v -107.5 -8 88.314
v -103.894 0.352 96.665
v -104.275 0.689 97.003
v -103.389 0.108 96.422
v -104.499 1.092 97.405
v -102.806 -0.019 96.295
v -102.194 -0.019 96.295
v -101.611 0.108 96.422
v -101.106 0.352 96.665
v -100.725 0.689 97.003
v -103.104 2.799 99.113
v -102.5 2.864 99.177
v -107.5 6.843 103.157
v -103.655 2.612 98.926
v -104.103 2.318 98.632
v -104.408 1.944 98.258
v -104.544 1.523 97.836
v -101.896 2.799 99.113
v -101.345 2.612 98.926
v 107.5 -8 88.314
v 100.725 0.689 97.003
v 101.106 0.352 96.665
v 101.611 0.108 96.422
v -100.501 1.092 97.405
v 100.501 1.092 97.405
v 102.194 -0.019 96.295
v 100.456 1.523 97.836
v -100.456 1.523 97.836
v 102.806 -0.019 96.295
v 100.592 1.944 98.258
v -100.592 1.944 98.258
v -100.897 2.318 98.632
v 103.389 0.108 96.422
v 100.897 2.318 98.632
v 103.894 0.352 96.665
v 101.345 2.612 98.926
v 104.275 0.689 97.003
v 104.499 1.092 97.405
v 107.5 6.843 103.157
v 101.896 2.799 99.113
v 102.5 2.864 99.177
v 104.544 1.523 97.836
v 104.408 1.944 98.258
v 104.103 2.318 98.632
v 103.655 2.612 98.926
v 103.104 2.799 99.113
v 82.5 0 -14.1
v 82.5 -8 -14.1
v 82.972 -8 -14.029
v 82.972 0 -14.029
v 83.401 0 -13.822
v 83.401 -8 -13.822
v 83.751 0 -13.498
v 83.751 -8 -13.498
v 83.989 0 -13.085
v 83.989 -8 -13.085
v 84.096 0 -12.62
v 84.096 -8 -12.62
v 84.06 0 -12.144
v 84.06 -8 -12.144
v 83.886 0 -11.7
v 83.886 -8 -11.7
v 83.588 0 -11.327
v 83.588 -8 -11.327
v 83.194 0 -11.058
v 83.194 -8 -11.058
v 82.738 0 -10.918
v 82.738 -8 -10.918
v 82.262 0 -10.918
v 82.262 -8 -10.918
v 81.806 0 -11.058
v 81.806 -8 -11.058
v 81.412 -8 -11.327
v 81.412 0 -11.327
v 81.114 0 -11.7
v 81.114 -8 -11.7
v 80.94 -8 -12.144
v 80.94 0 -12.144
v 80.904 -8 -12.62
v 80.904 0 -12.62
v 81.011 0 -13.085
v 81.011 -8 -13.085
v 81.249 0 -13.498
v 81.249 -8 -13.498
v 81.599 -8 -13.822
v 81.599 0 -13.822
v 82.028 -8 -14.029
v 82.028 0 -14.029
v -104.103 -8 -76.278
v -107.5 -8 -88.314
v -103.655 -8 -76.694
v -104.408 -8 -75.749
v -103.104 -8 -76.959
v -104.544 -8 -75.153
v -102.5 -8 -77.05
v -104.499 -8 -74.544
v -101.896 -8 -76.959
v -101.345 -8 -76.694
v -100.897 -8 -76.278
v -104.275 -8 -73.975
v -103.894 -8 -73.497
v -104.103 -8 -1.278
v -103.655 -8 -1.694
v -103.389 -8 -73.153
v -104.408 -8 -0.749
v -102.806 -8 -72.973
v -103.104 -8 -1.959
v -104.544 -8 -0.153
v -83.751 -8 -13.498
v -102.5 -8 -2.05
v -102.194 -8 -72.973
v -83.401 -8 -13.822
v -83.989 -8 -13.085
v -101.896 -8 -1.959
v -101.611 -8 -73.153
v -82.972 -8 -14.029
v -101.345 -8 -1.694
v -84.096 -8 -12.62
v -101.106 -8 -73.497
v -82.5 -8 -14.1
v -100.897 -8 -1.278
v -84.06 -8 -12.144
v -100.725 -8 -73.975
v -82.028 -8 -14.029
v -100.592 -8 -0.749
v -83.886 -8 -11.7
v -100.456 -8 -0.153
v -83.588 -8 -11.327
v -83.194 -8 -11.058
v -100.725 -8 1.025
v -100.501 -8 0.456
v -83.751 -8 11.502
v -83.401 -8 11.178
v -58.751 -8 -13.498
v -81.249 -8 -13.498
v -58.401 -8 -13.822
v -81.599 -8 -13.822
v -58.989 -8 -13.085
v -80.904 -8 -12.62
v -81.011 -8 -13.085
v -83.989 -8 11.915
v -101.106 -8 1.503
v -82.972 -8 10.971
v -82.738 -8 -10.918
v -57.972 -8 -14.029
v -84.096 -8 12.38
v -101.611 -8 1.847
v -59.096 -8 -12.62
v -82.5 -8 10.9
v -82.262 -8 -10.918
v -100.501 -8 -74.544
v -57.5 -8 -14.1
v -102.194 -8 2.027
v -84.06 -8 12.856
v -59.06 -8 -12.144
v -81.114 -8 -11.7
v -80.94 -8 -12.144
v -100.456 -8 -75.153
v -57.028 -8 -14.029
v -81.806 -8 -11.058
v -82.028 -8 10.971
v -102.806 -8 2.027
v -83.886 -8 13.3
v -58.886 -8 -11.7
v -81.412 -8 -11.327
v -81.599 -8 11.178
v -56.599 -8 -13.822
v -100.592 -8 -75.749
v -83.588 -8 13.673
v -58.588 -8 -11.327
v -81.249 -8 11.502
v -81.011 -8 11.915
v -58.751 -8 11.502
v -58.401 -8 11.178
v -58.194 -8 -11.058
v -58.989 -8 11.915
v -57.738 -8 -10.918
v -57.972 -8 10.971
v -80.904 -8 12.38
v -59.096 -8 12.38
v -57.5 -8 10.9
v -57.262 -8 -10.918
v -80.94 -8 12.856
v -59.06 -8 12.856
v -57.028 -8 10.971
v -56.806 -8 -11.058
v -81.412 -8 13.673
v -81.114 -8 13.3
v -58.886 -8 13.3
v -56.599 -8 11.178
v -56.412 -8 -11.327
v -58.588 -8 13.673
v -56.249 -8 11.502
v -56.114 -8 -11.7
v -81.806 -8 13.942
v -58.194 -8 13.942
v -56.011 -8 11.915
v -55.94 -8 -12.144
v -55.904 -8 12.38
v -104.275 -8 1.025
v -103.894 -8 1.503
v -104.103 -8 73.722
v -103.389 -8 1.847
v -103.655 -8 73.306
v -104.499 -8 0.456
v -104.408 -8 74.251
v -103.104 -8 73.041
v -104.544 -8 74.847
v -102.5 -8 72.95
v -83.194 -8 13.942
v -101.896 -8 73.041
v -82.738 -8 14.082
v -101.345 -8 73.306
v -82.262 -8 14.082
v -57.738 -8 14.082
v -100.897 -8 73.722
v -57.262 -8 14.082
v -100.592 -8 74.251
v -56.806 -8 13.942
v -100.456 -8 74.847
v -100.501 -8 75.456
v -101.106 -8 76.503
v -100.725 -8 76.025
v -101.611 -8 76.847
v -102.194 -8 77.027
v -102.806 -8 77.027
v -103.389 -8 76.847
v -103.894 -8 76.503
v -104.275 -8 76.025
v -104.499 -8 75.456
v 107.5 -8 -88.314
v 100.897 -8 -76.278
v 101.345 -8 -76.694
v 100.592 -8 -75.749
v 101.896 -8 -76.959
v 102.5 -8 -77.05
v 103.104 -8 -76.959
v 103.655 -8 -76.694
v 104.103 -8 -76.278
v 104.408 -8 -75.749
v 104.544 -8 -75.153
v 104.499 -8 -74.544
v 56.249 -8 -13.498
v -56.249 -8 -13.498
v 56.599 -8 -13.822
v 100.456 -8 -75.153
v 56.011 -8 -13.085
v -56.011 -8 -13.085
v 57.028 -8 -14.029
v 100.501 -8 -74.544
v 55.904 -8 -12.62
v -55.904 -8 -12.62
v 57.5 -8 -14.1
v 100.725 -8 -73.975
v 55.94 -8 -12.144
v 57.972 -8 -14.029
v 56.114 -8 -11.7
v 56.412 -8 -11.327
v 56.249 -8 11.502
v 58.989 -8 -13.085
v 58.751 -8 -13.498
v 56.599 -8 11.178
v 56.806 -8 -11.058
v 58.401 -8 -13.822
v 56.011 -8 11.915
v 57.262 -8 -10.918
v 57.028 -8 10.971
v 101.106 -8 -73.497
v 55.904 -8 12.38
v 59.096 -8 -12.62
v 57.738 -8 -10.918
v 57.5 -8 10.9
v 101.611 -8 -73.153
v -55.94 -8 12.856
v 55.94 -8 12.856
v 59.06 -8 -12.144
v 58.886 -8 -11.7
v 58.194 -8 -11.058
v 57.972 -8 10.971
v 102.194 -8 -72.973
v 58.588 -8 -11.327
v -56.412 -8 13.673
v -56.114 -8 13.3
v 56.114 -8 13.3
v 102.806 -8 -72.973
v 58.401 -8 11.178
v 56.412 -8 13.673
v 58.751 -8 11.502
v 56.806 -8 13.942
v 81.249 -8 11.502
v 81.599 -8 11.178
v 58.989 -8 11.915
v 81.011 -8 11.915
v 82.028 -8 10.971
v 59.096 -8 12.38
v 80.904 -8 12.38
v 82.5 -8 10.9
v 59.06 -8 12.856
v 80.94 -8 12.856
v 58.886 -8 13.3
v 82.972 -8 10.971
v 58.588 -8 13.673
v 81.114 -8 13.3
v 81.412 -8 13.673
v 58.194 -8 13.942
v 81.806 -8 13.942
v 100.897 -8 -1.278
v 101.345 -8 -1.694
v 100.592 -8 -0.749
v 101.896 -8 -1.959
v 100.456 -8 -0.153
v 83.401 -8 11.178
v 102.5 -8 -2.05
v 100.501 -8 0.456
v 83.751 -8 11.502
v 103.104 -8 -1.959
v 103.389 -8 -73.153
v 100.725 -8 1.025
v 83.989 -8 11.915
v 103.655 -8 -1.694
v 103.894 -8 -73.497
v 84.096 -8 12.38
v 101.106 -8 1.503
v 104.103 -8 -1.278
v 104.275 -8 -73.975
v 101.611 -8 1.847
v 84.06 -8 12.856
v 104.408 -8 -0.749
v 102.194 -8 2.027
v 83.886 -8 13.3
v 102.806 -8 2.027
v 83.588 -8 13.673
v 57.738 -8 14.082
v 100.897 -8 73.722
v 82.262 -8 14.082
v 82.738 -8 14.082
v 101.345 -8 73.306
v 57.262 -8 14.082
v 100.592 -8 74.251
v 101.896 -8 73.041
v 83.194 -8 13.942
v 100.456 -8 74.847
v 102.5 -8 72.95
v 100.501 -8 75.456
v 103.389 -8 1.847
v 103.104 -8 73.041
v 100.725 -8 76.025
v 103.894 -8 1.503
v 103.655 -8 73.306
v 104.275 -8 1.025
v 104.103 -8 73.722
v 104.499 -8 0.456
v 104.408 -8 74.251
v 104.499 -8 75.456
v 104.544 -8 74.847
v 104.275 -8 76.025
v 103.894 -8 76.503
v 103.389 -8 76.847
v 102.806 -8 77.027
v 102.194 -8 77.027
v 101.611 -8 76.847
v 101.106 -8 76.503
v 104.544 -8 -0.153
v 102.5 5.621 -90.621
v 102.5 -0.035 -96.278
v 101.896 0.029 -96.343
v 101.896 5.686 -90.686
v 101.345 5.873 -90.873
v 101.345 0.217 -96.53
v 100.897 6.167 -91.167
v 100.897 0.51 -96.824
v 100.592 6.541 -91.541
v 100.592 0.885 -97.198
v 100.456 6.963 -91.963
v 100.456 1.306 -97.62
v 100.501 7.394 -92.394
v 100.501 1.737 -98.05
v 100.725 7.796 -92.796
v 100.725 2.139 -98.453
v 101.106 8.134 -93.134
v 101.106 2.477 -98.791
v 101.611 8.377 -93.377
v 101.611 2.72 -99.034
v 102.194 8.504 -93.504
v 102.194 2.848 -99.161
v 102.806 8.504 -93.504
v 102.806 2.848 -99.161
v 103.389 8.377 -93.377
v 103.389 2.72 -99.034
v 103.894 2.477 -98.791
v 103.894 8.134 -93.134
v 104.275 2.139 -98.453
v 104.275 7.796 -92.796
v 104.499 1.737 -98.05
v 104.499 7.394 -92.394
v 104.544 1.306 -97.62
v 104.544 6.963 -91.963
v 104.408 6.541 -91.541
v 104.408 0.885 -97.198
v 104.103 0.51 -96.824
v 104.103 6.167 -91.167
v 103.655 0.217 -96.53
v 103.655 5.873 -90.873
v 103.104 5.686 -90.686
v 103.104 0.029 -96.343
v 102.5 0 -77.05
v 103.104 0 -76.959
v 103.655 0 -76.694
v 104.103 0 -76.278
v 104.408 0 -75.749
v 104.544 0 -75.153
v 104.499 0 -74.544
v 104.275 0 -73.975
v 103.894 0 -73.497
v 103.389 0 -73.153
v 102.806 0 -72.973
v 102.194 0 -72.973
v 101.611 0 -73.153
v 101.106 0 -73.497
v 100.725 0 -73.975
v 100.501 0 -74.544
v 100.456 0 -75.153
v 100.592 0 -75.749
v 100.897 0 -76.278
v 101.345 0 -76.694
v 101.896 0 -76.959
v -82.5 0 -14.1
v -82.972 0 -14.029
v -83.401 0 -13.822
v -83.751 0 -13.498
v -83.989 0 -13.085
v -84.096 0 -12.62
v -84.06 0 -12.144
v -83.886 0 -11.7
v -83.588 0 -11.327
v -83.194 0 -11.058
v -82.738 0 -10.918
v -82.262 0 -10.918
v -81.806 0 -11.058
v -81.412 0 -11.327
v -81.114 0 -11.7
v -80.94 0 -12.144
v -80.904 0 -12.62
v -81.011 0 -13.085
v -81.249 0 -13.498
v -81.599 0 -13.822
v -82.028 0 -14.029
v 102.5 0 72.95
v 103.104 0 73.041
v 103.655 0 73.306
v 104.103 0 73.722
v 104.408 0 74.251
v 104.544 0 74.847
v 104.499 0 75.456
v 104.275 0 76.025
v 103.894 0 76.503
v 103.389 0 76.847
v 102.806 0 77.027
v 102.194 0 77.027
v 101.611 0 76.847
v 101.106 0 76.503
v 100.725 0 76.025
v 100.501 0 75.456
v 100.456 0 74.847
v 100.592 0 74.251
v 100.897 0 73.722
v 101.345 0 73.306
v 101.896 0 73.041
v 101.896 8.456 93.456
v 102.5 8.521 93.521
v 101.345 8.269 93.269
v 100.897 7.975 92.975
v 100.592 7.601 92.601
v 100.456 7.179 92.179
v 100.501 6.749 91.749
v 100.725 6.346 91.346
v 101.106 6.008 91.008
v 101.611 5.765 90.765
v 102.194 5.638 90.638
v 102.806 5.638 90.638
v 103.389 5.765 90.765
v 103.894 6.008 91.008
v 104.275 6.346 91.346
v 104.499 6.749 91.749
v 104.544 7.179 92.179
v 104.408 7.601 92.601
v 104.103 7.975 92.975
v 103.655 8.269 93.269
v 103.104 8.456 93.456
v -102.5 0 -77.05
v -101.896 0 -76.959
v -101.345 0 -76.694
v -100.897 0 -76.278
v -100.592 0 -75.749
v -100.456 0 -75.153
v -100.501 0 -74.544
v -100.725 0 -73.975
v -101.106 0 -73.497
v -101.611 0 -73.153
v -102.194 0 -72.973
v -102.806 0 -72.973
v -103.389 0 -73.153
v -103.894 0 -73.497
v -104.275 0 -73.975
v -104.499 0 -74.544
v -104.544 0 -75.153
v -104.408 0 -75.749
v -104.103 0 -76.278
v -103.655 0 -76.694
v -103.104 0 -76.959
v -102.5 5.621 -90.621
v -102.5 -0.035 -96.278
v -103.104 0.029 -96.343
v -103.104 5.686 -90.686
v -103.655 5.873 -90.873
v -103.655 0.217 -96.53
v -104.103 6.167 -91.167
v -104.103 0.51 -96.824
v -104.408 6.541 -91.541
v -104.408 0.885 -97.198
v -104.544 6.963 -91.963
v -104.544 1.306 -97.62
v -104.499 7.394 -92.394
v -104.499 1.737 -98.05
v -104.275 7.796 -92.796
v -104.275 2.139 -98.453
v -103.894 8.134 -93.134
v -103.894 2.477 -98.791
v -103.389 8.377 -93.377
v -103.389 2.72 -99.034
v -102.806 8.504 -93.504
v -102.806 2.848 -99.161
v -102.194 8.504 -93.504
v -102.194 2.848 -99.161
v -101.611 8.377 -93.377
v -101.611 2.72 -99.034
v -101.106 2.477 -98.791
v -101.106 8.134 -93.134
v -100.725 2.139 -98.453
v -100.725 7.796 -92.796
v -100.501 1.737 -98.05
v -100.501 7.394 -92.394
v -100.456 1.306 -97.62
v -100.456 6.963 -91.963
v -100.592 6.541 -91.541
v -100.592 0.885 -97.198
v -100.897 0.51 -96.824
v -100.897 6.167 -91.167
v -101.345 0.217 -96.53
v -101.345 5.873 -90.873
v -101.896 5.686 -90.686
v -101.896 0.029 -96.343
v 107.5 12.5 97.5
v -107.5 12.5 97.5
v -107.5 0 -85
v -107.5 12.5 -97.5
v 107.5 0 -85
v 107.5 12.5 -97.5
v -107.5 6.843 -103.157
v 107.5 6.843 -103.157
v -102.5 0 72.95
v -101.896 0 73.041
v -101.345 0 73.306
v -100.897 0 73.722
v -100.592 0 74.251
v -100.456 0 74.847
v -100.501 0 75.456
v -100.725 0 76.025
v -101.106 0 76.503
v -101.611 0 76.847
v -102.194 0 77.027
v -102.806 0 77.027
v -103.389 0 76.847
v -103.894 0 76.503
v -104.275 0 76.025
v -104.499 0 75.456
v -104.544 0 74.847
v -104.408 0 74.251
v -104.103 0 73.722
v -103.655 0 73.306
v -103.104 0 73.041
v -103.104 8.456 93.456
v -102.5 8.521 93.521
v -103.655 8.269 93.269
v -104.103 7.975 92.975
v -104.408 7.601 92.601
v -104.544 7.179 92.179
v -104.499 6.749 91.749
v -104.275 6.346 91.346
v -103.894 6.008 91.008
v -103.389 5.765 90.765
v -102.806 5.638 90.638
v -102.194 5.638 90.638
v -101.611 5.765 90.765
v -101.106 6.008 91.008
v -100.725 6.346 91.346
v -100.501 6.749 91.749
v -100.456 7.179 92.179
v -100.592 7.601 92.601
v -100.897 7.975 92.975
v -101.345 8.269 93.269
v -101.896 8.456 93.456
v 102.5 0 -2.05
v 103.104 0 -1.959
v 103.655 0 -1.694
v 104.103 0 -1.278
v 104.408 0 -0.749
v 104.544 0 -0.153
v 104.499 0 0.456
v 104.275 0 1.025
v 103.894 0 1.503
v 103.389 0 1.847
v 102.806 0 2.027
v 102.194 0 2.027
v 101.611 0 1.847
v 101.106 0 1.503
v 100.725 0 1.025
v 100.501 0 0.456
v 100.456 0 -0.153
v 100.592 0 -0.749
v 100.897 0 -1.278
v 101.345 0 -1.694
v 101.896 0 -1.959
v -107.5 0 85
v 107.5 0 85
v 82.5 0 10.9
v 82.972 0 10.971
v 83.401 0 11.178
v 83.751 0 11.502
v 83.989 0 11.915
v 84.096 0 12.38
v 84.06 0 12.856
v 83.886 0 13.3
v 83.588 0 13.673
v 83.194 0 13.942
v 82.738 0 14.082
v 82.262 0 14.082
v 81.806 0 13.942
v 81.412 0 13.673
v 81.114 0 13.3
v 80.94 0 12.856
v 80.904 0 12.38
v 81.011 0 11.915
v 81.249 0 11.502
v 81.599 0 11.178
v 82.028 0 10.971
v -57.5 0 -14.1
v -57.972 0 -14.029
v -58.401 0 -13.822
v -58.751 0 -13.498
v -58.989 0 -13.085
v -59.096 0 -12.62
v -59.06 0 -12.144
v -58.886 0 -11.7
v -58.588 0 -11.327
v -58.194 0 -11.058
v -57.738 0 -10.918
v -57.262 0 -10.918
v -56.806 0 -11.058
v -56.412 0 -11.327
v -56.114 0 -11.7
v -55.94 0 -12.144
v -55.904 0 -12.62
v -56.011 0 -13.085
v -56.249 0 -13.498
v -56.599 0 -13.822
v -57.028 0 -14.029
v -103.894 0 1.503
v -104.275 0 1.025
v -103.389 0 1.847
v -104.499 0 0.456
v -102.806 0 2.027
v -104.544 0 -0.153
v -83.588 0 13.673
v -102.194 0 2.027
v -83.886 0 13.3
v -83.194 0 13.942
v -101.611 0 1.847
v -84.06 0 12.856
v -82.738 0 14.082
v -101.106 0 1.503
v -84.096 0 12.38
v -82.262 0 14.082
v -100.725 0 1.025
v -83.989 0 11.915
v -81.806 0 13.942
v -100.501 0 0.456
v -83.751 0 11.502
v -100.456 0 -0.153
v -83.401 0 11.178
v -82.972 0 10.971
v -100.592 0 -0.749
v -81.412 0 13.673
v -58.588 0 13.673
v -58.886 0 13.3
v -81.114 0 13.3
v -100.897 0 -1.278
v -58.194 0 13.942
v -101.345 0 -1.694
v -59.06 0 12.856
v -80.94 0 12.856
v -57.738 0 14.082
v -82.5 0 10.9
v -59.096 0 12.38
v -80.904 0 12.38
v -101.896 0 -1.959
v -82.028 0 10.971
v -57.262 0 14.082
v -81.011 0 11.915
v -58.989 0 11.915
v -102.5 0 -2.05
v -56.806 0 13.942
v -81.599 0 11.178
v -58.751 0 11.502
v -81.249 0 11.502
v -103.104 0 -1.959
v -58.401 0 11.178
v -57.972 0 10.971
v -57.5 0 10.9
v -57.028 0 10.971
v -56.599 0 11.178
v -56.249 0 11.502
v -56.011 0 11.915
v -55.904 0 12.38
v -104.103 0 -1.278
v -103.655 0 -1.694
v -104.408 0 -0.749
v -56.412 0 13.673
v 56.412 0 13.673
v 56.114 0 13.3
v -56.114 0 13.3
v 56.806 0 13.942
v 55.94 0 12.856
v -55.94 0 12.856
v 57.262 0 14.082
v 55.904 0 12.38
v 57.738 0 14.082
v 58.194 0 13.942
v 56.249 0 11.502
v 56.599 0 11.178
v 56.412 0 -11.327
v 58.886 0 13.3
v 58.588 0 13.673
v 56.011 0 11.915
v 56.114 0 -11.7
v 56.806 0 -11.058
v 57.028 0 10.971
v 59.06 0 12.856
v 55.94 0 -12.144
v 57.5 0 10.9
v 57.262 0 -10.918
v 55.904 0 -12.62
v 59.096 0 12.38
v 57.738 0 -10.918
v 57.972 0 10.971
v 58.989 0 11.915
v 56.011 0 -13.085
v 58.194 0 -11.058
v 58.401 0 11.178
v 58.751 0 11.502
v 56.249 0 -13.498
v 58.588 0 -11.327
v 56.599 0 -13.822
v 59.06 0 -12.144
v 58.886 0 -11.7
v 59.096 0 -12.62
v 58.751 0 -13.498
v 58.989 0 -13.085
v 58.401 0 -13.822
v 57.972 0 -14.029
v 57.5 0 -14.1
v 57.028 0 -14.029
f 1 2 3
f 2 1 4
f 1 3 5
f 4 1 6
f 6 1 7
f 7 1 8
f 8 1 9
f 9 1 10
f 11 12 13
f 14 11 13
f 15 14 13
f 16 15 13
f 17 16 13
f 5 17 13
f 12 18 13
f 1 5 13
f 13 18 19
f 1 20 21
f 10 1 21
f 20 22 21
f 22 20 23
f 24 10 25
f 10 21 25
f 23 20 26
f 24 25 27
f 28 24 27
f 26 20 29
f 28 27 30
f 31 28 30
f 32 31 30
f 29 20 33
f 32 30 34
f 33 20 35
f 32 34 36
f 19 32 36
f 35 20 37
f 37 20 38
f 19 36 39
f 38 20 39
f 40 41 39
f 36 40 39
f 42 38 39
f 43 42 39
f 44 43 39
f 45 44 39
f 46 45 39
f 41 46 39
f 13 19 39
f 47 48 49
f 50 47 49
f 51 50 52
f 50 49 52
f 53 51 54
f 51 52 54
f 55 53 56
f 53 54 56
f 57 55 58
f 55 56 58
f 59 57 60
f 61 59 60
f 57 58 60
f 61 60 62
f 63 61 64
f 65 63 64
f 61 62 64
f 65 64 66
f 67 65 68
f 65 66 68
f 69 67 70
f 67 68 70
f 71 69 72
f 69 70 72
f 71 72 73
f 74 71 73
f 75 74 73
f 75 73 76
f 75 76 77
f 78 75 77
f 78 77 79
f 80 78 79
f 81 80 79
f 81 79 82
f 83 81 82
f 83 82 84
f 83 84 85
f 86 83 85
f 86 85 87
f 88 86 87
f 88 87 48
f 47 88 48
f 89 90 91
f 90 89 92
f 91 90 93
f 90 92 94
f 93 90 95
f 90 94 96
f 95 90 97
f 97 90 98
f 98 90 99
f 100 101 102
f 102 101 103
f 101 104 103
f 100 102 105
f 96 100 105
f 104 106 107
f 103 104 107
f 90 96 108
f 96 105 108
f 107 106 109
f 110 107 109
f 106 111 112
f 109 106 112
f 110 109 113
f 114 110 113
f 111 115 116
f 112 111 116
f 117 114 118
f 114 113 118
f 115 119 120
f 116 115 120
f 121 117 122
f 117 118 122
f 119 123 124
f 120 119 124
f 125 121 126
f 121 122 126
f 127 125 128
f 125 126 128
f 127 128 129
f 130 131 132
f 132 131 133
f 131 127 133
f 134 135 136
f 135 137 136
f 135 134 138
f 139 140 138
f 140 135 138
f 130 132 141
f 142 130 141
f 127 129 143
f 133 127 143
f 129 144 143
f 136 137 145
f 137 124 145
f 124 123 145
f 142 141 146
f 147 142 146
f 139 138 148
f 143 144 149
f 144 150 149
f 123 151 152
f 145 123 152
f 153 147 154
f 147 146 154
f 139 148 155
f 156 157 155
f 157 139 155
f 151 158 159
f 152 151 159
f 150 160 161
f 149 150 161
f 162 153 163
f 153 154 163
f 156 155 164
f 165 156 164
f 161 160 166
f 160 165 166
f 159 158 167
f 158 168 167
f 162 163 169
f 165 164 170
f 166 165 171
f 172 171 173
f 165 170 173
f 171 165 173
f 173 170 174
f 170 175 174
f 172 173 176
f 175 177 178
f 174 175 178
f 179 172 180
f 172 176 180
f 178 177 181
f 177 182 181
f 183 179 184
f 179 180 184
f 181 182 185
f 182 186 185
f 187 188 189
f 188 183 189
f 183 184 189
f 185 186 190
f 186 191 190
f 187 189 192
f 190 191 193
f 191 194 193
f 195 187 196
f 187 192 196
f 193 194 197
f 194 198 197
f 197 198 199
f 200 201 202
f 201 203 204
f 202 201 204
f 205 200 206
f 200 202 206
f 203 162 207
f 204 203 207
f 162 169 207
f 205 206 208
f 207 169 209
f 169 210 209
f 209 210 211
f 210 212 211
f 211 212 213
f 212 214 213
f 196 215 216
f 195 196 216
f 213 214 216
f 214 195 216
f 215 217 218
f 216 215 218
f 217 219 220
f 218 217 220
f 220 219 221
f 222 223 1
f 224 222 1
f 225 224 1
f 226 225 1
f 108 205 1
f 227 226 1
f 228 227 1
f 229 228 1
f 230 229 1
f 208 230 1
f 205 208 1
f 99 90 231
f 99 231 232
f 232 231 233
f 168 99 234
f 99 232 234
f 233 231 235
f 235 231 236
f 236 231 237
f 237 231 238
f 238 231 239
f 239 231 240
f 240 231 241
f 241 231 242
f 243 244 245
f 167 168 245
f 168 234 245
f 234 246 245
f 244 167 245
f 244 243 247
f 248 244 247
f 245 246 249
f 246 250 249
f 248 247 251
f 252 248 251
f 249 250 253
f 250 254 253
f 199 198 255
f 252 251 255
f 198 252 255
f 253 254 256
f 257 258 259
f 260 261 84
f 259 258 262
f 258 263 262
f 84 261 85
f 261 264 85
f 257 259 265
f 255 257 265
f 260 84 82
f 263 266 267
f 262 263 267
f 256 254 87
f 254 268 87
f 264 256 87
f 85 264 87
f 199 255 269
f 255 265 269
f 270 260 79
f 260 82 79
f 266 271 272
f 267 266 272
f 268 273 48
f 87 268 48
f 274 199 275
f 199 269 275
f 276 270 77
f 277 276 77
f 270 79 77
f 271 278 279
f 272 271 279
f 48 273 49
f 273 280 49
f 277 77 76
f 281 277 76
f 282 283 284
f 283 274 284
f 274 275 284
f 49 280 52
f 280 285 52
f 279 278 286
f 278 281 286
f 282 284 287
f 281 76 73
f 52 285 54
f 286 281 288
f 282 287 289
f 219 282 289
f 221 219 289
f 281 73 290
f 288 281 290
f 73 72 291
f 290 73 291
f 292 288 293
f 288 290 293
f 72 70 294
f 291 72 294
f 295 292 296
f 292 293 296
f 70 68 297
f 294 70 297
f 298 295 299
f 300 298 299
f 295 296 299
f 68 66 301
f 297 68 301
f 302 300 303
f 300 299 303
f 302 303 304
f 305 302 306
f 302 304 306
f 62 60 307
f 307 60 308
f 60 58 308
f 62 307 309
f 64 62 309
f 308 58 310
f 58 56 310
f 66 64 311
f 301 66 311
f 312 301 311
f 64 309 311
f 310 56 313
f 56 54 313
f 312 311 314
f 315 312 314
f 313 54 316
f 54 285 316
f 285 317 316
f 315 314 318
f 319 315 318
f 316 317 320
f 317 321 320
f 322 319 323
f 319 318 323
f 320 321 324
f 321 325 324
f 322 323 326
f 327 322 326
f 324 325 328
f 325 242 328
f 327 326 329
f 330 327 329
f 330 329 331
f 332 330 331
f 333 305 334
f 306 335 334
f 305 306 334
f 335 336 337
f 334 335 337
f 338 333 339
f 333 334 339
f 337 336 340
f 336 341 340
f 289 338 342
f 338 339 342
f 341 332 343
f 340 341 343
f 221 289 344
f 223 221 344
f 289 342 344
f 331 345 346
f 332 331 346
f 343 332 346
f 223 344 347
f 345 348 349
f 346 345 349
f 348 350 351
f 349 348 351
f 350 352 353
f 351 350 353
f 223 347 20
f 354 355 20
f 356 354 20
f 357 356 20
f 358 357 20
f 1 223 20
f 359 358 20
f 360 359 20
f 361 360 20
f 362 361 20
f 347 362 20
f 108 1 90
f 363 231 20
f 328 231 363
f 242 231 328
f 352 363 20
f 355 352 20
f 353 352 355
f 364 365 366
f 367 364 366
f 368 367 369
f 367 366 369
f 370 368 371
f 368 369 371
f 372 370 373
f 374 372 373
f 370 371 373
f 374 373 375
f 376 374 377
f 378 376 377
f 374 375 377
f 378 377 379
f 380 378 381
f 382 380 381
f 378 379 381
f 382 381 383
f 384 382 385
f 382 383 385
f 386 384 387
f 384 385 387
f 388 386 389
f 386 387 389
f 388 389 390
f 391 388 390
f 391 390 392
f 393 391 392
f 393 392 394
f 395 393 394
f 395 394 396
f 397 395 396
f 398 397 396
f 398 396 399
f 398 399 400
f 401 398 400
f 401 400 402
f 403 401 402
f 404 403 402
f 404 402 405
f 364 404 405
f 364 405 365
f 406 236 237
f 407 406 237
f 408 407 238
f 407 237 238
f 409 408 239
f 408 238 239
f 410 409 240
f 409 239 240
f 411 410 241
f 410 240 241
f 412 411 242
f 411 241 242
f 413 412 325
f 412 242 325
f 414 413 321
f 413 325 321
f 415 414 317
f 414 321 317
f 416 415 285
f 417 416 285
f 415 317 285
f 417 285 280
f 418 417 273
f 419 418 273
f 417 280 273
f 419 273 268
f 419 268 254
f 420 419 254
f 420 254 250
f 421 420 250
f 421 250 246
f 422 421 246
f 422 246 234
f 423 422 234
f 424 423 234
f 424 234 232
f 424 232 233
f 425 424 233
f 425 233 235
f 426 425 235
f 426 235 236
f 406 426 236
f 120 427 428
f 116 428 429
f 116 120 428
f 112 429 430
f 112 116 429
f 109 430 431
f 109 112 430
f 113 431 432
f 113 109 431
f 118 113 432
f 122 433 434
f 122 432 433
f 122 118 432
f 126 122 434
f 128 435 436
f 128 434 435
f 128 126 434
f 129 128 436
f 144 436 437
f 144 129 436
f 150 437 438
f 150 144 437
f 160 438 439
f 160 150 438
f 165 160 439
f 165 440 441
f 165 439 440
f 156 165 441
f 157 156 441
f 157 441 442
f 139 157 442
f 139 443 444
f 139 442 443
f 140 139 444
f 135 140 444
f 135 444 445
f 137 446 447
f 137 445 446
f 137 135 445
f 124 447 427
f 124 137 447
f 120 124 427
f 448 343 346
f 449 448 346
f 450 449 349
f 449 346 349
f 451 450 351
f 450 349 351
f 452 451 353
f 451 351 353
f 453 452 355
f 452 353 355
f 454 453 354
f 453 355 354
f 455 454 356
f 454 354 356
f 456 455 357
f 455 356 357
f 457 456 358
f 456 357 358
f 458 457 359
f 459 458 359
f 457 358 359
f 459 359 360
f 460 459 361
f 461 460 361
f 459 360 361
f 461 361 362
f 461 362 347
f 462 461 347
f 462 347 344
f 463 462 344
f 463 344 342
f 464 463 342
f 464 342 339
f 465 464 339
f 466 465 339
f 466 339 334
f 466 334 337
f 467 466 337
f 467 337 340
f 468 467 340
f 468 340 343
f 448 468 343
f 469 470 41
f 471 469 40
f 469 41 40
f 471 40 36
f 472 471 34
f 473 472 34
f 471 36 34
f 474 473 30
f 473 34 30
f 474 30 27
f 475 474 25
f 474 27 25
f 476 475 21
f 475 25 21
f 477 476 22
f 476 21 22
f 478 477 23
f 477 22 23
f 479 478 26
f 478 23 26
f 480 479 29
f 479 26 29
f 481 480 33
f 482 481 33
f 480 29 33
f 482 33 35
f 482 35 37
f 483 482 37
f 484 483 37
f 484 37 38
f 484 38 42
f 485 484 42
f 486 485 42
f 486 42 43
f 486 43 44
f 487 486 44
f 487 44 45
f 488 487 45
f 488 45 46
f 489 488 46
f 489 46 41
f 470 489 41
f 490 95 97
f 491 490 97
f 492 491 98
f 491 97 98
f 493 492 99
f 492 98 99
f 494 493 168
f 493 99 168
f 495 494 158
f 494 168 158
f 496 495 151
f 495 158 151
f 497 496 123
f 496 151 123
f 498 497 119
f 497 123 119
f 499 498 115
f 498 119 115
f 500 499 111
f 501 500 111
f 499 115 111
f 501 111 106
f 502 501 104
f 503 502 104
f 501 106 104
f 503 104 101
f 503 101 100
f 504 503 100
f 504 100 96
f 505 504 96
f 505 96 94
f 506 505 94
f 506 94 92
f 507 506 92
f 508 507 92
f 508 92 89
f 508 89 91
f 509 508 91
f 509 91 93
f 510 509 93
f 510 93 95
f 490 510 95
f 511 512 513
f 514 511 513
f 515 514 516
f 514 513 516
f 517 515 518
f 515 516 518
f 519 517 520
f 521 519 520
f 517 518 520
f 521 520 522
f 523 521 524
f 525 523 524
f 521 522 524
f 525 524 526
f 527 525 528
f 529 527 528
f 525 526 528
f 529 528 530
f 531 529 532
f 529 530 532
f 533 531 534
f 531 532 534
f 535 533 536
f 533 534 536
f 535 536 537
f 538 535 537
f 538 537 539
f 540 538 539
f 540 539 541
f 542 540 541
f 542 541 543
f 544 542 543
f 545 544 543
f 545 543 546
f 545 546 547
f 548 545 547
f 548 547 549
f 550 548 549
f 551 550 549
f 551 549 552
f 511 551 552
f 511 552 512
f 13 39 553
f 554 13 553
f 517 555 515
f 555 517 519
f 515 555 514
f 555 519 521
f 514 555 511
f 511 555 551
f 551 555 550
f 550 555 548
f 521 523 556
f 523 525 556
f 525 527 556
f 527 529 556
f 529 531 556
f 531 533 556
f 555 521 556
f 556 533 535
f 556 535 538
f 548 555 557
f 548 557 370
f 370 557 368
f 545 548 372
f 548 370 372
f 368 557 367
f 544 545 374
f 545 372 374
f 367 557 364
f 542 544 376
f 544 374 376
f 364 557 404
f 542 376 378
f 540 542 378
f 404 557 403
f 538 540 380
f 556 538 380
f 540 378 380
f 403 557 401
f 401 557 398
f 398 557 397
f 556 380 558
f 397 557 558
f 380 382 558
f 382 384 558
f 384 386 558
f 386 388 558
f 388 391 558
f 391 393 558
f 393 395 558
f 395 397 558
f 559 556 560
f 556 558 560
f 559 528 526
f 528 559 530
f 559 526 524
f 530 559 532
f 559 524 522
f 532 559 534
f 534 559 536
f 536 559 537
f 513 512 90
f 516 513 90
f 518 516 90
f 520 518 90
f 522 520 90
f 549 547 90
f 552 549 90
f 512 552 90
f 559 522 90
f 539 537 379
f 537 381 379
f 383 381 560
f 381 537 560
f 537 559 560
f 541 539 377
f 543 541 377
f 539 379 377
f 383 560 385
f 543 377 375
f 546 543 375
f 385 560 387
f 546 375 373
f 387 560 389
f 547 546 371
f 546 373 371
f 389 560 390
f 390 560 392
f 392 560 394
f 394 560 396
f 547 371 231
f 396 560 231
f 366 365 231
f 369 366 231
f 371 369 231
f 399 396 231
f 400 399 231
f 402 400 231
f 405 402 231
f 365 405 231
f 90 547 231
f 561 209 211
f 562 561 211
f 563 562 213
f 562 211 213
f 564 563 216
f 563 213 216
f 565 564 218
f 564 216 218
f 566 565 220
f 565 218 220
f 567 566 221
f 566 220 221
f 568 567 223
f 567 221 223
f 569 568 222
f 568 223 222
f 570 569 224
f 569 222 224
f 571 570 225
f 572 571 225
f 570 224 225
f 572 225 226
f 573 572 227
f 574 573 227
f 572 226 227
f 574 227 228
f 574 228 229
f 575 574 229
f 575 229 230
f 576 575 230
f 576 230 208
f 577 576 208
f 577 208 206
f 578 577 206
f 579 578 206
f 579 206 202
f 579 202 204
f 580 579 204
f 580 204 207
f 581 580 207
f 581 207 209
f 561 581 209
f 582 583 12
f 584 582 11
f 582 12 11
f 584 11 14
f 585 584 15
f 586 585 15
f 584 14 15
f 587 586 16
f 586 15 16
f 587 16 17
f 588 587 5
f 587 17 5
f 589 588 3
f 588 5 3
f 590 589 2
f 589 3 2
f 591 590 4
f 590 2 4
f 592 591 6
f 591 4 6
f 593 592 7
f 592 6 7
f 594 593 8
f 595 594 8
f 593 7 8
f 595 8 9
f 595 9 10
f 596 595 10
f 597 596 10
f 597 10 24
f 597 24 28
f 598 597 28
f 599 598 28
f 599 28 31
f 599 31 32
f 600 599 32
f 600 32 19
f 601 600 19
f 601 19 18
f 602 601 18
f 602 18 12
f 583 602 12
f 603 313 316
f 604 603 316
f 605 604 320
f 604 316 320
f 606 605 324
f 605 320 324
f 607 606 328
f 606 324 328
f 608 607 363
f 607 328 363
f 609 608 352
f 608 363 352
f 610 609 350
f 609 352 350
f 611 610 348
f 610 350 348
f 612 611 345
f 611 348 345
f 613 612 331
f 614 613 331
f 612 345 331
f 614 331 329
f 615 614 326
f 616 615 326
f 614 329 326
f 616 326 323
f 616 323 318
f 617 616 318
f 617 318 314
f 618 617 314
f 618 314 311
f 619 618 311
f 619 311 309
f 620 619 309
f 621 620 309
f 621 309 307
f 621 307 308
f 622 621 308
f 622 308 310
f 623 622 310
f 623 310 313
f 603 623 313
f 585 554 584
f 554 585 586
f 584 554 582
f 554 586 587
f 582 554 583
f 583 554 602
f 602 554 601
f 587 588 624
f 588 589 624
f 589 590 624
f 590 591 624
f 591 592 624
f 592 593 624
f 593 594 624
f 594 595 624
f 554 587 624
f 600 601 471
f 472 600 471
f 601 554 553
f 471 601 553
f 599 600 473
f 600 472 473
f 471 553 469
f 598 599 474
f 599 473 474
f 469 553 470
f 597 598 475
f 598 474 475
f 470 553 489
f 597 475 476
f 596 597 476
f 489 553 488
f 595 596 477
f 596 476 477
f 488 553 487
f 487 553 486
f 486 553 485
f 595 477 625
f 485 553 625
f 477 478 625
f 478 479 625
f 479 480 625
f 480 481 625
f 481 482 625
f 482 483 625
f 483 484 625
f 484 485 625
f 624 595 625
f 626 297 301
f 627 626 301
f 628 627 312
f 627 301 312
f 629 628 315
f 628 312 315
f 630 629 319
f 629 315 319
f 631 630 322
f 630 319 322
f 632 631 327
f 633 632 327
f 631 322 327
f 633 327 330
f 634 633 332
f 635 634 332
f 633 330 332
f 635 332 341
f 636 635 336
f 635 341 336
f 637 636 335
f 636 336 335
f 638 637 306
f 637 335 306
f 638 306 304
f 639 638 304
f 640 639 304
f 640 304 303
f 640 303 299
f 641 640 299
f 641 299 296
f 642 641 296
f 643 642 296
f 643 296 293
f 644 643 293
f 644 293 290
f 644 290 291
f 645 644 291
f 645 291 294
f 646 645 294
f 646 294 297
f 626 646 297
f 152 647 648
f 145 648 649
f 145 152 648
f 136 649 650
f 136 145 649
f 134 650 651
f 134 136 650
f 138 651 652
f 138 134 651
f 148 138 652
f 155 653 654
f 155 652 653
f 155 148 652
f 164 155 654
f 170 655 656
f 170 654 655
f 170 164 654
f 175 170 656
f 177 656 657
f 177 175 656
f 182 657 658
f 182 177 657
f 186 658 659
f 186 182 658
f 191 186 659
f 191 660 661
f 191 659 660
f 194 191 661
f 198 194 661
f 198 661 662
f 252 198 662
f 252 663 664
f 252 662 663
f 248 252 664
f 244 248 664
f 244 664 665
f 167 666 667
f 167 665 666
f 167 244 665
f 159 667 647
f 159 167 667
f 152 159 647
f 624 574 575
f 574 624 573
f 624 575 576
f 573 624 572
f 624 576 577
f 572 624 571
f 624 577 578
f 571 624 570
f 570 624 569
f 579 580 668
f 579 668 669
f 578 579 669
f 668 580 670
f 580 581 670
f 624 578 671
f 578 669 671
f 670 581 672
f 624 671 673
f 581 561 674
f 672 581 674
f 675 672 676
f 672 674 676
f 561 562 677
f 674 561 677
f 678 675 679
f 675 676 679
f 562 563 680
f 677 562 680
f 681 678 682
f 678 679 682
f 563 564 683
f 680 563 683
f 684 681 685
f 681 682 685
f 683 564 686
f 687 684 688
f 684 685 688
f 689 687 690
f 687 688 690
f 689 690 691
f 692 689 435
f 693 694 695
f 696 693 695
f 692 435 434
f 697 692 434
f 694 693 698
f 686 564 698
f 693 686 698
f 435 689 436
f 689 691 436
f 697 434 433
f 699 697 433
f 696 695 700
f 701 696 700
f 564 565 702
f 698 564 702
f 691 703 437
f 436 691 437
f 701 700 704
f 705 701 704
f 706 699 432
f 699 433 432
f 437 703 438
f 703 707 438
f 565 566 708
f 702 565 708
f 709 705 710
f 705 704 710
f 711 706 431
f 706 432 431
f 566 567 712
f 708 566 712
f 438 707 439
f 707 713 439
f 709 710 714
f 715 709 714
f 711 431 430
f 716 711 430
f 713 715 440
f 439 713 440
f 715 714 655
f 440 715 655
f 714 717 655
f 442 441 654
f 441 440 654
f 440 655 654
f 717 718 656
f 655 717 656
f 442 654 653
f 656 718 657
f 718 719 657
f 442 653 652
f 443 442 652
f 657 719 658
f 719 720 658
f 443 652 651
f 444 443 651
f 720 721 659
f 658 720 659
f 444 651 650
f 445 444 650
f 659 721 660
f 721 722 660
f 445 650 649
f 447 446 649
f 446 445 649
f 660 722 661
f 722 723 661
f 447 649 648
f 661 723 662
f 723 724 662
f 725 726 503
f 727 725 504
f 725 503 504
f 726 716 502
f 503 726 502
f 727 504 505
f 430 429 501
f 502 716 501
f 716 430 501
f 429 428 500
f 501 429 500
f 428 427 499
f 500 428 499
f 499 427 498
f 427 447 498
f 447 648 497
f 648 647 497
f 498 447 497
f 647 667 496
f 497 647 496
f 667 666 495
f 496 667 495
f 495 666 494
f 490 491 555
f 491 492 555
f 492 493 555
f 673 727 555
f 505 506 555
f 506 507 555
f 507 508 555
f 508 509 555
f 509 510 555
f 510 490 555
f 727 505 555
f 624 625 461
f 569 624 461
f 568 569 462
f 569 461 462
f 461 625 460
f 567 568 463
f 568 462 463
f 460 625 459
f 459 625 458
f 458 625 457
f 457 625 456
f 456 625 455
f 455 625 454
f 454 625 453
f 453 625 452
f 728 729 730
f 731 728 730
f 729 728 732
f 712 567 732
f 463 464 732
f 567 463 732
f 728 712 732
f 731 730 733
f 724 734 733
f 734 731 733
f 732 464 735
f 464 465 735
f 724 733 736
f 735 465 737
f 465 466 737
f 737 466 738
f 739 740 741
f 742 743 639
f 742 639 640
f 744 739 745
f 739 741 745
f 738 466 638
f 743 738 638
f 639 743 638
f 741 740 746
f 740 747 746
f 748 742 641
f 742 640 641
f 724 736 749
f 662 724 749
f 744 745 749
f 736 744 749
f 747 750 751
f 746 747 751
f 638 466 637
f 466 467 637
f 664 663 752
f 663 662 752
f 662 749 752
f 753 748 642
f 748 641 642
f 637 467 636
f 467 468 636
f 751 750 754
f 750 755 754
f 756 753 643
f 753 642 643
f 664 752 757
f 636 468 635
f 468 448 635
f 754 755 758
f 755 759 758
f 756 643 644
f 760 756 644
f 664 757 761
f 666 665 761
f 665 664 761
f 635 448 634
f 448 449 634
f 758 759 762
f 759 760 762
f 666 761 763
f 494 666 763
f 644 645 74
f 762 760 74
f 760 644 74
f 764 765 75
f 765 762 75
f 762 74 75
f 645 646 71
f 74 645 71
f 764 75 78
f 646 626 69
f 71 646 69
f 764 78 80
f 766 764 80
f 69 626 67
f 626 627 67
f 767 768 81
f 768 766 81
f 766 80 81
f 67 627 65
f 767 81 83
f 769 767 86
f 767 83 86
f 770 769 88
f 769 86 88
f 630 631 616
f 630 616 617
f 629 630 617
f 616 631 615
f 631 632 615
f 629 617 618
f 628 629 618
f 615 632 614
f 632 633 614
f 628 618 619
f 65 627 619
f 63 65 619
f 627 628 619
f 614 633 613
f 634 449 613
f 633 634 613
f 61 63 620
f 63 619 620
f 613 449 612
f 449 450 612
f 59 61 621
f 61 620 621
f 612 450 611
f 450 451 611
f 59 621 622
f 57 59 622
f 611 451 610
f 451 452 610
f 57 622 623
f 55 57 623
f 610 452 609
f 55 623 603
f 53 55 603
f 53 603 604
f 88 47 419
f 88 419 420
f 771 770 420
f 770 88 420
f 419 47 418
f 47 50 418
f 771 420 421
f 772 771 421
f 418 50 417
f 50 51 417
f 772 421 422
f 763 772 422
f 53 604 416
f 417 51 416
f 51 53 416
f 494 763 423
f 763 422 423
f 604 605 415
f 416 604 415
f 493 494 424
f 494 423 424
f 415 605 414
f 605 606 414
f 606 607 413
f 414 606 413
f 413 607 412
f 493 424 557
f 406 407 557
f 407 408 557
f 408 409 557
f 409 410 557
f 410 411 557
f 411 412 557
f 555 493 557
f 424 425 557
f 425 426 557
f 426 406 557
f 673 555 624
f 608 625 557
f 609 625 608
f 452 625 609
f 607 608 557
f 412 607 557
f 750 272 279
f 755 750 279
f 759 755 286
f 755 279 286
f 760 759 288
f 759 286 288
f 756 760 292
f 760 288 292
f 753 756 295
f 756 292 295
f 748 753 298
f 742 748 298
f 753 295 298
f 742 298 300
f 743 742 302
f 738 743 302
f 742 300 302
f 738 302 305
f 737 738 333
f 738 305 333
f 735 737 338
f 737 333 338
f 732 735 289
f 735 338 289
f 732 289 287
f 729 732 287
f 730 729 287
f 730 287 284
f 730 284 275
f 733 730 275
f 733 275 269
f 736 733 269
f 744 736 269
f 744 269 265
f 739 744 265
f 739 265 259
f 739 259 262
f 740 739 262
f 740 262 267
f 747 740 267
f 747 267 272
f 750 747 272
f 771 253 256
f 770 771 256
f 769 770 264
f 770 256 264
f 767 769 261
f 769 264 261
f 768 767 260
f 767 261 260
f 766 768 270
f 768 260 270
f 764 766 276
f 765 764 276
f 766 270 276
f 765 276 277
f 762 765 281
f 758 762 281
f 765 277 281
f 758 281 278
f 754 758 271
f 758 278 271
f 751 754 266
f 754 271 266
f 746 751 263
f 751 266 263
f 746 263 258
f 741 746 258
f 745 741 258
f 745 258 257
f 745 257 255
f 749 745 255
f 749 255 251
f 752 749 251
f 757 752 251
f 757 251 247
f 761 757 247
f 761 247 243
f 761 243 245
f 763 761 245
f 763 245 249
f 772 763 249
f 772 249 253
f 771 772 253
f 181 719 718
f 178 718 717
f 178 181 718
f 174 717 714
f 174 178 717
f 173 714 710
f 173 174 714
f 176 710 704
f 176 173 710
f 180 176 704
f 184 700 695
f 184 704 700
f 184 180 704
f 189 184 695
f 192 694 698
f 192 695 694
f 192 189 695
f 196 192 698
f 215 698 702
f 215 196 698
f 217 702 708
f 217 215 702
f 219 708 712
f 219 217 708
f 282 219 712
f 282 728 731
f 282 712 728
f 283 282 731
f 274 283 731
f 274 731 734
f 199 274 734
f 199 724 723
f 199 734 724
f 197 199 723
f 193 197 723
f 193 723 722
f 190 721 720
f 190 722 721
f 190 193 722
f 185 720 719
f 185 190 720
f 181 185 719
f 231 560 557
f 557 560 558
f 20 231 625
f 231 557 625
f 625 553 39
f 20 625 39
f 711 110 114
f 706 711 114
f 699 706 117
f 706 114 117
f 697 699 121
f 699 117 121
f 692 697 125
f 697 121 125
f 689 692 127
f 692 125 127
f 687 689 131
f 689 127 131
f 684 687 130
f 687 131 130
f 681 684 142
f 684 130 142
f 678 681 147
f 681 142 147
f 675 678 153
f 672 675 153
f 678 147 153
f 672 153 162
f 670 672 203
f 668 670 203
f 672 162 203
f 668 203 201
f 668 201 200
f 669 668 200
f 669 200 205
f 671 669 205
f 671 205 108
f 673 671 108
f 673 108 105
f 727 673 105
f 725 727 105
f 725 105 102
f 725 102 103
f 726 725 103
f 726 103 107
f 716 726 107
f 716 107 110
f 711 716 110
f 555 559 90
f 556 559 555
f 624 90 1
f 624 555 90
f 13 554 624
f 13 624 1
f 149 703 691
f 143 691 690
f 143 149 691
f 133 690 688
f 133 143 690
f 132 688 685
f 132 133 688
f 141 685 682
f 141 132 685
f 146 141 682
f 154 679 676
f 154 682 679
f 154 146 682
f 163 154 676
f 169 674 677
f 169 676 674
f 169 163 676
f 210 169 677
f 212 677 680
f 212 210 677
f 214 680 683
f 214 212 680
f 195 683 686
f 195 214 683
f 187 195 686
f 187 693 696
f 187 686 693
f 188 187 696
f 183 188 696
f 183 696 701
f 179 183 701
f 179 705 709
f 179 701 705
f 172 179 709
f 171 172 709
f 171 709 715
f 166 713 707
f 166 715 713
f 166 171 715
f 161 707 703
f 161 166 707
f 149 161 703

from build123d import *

# Parameters (mm, degrees)
MAIN_DEPTH                      = 107.5
F_4_0MM_DOWEL_HOLE1_D           = 4.1
F_4_0MM_DOWEL_HOLE1_ON_FACE_2_D = 4.1
F_4_0MM_DOWEL_HOLE1_ON_FACE_3_D = 4.1
F_4_0MM_DOWEL_HOLE1_ON_FACE_4_D = 4.1
SKETCH4_R                       = 1.6
ATTACHMENT_SCREW_HOLES_DEPTH    = 151.392275662


with BuildPart() as part:
    # Sketch2 → Main (new, symmetric)
    with BuildSketch(Plane(origin=(0, 0, 0), x_dir=(0, 0, -1), z_dir=(1, 0, 0))):
        Polygon((-85, 0), (85, 0), (97.5, 12.5), (103.156854249, 6.843145751), (88.313708499, -8), (-88.313708499, -8), (-103.156854249, 6.843145751), (-97.5, 12.5), align=None)
    extrude(amount=MAIN_DEPTH, both=True)

    # Ø4.0mm Dowel Hole1 (through all)
    with Locations(Plane(origin=(-102.5, 7.071067812, -92.071067812), x_dir=(0, 0.707106781187, -0.707106781187), z_dir=(0, 0.707106781187, 0.707106781187))):
        with Locations((0, 0)):
            Hole(F_4_0MM_DOWEL_HOLE1_D / 2)

    # Ø4.0mm Dowel Hole1 on face 2 (through all)
    with Locations(Plane(origin=(-102.5, 0, -75), x_dir=(0, 0, 1), z_dir=(0, 1, 0))):
        with Locations((0, 0), (75, 0), (150, 0), (150, 205), (75, 205), (0, 205)):
            Hole(F_4_0MM_DOWEL_HOLE1_ON_FACE_2_D / 2)

    # Ø4.0mm Dowel Hole1 on face 3 (through all)
    with Locations(Plane(origin=(-102.5, 7.071067812, 92.071067812), x_dir=(0, -0.707106781187, -0.707106781187), z_dir=(0, 0.707106781187, -0.707106781187))):
        with Locations((0, 0), (0, -205)):
            Hole(F_4_0MM_DOWEL_HOLE1_ON_FACE_3_D / 2)

    # Ø4.0mm Dowel Hole1 on face 4 (through all)
    with Locations(Plane(origin=(102.5, 7.071067812, -92.071067812), x_dir=(0, 0.707106781187, -0.707106781187), z_dir=(0, 0.707106781187, 0.707106781187))):
        with Locations((0, 0)):
            Hole(F_4_0MM_DOWEL_HOLE1_ON_FACE_4_D / 2)

    # Sketch4 → Attachment screw holes (cut, through all)
    with BuildSketch(Plane.XZ.offset(8)):
        with Locations(Location((57.5, 12.5, 0), (0, 0, 270))):
            Circle(SKETCH4_R)
        with Locations(Location((82.5, 12.5, 0), (0, 0, 270))):
            Circle(SKETCH4_R)
        with Locations(Location((82.5, -12.5, 0), (0, 0, 270))):
            Circle(SKETCH4_R)
        with Locations(Location((57.5, -12.5, 0), (0, 0, 270))):
            Circle(SKETCH4_R)
    attachment_screw_holes = extrude(amount=-ATTACHMENT_SCREW_HOLES_DEPTH, mode=Mode.SUBTRACT)

    # Mirror1: Attachment screw holes across plane
    add(attachment_screw_holes.mirror(Plane(origin=(0, 0, 0), x_dir=(0, 0, 1), z_dir=(1, 0, 0))), mode=Mode.SUBTRACT)


solid = part.part
